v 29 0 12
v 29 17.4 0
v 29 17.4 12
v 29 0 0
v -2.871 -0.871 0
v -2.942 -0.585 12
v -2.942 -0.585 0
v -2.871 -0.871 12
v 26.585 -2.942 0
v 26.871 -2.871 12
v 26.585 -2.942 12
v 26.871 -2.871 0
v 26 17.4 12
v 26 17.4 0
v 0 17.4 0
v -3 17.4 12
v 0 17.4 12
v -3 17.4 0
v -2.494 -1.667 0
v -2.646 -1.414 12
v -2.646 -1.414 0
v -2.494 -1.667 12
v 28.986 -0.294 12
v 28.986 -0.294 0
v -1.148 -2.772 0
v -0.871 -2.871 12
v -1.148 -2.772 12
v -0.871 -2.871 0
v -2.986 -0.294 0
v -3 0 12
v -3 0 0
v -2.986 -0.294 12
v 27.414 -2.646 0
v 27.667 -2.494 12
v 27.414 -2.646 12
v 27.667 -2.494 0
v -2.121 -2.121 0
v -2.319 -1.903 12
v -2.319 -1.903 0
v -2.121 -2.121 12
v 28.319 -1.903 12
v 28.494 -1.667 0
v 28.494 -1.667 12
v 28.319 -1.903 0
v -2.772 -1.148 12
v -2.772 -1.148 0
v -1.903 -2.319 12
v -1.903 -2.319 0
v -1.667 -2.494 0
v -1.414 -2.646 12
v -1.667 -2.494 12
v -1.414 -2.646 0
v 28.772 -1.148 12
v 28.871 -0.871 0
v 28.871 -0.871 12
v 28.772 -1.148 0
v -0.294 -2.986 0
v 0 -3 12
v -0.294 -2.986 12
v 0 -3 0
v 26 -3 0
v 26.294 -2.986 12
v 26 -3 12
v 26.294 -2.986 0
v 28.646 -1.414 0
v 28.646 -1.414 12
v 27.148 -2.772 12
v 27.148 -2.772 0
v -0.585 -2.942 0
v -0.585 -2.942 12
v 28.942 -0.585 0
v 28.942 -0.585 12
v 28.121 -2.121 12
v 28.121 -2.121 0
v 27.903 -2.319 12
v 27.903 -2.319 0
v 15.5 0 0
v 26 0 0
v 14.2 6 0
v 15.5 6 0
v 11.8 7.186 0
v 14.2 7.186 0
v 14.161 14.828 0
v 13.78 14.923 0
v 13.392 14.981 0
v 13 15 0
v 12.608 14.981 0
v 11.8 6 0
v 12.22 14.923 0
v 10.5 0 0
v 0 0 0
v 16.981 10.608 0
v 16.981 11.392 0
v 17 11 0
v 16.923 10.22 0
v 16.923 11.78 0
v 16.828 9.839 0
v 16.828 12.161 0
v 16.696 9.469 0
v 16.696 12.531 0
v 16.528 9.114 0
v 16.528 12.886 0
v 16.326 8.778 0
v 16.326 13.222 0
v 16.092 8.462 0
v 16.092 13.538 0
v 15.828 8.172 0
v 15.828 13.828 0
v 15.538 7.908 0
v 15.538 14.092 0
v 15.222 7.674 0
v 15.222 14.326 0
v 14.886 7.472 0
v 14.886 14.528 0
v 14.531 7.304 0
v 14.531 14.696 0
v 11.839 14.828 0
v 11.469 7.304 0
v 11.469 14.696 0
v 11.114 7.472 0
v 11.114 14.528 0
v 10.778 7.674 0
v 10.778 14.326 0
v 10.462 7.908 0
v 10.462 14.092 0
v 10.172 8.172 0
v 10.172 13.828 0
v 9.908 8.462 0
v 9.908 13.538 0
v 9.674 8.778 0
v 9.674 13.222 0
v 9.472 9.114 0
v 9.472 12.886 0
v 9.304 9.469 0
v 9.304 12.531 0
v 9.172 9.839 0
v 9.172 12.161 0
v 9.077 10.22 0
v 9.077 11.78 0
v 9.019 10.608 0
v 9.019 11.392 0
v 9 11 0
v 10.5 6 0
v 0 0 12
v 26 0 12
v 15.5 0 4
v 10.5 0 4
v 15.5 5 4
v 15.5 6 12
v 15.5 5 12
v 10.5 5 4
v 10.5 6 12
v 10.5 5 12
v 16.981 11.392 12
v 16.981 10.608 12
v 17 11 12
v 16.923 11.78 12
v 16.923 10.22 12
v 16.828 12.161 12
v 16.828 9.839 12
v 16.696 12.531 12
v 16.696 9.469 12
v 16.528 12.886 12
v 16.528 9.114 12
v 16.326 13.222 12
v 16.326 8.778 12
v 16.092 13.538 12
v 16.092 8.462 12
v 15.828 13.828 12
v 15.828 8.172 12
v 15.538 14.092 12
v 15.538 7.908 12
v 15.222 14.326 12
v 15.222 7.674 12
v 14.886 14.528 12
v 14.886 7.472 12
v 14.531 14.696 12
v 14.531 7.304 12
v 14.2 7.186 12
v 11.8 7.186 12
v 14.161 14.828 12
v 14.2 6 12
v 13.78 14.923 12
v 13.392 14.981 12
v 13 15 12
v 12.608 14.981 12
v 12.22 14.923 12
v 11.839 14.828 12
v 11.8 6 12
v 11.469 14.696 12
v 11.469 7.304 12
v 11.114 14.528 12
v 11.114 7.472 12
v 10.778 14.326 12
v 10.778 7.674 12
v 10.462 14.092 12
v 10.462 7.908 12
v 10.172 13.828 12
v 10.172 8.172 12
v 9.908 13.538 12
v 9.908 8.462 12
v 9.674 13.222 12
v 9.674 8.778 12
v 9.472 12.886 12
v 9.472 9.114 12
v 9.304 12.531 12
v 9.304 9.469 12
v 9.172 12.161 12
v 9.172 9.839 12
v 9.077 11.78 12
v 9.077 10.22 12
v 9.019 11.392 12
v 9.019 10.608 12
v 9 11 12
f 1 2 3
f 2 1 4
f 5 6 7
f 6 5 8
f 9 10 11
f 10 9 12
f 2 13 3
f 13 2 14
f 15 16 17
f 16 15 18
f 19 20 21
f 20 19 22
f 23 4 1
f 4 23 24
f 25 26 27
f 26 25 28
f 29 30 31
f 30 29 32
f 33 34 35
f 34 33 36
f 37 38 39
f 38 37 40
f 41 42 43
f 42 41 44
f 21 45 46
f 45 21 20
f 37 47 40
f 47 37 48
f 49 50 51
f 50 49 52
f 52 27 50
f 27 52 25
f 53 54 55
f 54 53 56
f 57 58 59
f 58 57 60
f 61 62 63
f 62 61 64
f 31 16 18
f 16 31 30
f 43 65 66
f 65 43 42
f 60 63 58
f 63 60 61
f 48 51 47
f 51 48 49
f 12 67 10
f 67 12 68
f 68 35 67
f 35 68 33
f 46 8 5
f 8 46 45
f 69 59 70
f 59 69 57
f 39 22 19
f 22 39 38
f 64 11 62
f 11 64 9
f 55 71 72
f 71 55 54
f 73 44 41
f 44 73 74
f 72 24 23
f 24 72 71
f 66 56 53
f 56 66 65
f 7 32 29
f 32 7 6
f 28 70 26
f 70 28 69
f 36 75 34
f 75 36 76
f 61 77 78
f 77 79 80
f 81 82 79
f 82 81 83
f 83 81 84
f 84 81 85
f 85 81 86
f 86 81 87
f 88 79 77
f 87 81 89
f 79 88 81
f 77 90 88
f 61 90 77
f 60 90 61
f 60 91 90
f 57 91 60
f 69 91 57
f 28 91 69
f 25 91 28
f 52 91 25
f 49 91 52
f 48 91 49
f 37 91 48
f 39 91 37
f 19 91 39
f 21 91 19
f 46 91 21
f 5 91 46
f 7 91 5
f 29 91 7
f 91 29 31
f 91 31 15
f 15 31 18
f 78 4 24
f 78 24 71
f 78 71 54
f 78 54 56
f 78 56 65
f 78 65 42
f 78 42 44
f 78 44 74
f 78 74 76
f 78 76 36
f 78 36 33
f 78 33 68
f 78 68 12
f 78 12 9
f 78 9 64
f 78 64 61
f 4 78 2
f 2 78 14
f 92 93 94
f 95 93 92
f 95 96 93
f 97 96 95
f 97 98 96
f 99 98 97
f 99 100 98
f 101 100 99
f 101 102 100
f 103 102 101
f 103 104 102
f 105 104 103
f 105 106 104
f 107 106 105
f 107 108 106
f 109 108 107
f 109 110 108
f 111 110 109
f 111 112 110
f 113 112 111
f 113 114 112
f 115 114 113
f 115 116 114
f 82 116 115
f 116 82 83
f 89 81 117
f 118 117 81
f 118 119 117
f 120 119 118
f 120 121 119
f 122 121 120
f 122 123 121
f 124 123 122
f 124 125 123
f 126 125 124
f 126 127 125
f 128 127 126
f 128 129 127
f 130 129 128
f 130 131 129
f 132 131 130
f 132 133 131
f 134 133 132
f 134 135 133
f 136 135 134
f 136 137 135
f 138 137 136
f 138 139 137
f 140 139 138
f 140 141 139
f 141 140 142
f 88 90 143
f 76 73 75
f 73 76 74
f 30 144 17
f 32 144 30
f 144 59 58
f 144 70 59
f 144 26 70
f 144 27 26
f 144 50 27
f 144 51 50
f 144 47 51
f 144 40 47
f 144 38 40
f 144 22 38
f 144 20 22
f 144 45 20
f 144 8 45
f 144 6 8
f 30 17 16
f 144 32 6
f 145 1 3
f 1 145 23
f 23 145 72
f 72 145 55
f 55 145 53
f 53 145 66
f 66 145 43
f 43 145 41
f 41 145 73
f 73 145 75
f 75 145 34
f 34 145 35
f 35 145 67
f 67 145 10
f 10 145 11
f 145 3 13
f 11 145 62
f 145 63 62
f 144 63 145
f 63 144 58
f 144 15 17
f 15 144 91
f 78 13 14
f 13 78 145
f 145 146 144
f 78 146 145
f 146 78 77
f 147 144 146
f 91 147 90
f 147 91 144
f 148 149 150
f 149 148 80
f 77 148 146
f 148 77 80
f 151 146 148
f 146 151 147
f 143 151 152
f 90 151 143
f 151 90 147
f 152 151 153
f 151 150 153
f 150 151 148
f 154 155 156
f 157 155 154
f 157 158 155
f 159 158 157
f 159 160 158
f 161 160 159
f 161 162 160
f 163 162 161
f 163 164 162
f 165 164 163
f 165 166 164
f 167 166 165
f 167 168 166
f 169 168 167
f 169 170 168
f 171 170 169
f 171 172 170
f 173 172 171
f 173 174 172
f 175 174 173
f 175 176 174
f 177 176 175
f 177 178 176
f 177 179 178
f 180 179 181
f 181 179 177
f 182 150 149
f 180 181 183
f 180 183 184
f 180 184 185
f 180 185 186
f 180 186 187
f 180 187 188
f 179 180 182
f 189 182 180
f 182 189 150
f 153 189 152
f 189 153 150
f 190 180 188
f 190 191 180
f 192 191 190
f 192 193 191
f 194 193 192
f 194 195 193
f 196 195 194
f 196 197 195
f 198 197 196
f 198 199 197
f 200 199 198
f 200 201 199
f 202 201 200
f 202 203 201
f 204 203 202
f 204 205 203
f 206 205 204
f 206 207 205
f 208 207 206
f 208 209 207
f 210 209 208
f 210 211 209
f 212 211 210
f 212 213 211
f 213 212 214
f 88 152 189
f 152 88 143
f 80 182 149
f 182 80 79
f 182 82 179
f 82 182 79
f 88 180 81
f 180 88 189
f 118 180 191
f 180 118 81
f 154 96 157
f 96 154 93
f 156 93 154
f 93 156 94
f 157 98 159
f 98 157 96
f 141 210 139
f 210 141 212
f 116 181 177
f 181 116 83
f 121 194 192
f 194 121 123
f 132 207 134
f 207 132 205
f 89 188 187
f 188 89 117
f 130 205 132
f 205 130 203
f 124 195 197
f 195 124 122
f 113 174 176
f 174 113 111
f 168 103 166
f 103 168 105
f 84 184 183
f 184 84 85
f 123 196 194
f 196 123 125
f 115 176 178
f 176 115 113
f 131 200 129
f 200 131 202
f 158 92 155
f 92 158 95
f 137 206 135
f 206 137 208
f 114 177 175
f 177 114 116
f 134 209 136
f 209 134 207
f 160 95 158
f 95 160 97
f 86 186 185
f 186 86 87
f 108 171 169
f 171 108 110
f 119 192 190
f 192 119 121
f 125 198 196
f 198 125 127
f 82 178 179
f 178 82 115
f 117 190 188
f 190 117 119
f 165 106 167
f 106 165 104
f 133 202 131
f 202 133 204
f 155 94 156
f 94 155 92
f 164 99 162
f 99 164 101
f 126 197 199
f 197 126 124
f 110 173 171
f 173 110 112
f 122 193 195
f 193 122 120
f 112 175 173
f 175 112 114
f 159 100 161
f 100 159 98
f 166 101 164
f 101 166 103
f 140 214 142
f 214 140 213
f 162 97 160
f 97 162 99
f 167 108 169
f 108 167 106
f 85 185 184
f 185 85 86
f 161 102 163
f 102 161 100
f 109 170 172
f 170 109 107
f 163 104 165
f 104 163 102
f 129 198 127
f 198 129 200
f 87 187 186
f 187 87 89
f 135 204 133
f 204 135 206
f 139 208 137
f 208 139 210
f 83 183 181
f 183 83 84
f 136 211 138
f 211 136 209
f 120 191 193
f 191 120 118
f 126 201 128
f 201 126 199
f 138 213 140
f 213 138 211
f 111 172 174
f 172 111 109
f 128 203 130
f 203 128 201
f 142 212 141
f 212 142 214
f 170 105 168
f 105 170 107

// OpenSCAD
$fn=64;
cylinder_diamter = 8;
total_width = 12;
stem_diameter = 2.4;
stem_height = 2;

stem_width = total_width - 4;

corner_radius = 3;
inner_width = 26;
wall_strength = 3;

inner_corner_radius = corner_radius - wall_strength;
inner_inner_width = inner_width - (wall_strength * 2);

connector_cube_width = 5;
connector_cube_height = 5;
connector_cube_thickness = 4;
base_cube_height = 1;

difference() {
    hull() {
        cylinder(r=corner_radius, h=total_width);
        translate([inner_width, 0, 0]) cylinder(r=corner_radius, h=total_width);
        translate([-corner_radius, 0, 0]) cube([inner_width + (corner_radius * 2), 20.4 - corner_radius, total_width]);
    }

    hull() {
        cylinder(r=inner_corner_radius, h=total_width+2);
        translate([inner_width, 0, 0]) cylinder(r=inner_corner_radius, h=total_width+2);
        translate([-inner_corner_radius, 0, 0]) cube([inner_width + (inner_corner_radius * 2), 30, total_width+2]);
    }
}
translate([(inner_width / 2) - (connector_cube_width / 2), -3, 0]) cube([connector_cube_width, connector_cube_height + 3, connector_cube_thickness]);
translate([(inner_width / 2) - (connector_cube_width / 2), 5, 0]) cube([connector_cube_width, base_cube_height, 12]);
translate([(inner_width / 2) - (stem_diameter / 2), 5, 0]) cube([stem_diameter, stem_height + 1, total_width]);
translate([(inner_width / 2), connector_cube_height + stem_height + cylinder_diamter / 2, 0]) cylinder(d = cylinder_diamter, h=total_width);
